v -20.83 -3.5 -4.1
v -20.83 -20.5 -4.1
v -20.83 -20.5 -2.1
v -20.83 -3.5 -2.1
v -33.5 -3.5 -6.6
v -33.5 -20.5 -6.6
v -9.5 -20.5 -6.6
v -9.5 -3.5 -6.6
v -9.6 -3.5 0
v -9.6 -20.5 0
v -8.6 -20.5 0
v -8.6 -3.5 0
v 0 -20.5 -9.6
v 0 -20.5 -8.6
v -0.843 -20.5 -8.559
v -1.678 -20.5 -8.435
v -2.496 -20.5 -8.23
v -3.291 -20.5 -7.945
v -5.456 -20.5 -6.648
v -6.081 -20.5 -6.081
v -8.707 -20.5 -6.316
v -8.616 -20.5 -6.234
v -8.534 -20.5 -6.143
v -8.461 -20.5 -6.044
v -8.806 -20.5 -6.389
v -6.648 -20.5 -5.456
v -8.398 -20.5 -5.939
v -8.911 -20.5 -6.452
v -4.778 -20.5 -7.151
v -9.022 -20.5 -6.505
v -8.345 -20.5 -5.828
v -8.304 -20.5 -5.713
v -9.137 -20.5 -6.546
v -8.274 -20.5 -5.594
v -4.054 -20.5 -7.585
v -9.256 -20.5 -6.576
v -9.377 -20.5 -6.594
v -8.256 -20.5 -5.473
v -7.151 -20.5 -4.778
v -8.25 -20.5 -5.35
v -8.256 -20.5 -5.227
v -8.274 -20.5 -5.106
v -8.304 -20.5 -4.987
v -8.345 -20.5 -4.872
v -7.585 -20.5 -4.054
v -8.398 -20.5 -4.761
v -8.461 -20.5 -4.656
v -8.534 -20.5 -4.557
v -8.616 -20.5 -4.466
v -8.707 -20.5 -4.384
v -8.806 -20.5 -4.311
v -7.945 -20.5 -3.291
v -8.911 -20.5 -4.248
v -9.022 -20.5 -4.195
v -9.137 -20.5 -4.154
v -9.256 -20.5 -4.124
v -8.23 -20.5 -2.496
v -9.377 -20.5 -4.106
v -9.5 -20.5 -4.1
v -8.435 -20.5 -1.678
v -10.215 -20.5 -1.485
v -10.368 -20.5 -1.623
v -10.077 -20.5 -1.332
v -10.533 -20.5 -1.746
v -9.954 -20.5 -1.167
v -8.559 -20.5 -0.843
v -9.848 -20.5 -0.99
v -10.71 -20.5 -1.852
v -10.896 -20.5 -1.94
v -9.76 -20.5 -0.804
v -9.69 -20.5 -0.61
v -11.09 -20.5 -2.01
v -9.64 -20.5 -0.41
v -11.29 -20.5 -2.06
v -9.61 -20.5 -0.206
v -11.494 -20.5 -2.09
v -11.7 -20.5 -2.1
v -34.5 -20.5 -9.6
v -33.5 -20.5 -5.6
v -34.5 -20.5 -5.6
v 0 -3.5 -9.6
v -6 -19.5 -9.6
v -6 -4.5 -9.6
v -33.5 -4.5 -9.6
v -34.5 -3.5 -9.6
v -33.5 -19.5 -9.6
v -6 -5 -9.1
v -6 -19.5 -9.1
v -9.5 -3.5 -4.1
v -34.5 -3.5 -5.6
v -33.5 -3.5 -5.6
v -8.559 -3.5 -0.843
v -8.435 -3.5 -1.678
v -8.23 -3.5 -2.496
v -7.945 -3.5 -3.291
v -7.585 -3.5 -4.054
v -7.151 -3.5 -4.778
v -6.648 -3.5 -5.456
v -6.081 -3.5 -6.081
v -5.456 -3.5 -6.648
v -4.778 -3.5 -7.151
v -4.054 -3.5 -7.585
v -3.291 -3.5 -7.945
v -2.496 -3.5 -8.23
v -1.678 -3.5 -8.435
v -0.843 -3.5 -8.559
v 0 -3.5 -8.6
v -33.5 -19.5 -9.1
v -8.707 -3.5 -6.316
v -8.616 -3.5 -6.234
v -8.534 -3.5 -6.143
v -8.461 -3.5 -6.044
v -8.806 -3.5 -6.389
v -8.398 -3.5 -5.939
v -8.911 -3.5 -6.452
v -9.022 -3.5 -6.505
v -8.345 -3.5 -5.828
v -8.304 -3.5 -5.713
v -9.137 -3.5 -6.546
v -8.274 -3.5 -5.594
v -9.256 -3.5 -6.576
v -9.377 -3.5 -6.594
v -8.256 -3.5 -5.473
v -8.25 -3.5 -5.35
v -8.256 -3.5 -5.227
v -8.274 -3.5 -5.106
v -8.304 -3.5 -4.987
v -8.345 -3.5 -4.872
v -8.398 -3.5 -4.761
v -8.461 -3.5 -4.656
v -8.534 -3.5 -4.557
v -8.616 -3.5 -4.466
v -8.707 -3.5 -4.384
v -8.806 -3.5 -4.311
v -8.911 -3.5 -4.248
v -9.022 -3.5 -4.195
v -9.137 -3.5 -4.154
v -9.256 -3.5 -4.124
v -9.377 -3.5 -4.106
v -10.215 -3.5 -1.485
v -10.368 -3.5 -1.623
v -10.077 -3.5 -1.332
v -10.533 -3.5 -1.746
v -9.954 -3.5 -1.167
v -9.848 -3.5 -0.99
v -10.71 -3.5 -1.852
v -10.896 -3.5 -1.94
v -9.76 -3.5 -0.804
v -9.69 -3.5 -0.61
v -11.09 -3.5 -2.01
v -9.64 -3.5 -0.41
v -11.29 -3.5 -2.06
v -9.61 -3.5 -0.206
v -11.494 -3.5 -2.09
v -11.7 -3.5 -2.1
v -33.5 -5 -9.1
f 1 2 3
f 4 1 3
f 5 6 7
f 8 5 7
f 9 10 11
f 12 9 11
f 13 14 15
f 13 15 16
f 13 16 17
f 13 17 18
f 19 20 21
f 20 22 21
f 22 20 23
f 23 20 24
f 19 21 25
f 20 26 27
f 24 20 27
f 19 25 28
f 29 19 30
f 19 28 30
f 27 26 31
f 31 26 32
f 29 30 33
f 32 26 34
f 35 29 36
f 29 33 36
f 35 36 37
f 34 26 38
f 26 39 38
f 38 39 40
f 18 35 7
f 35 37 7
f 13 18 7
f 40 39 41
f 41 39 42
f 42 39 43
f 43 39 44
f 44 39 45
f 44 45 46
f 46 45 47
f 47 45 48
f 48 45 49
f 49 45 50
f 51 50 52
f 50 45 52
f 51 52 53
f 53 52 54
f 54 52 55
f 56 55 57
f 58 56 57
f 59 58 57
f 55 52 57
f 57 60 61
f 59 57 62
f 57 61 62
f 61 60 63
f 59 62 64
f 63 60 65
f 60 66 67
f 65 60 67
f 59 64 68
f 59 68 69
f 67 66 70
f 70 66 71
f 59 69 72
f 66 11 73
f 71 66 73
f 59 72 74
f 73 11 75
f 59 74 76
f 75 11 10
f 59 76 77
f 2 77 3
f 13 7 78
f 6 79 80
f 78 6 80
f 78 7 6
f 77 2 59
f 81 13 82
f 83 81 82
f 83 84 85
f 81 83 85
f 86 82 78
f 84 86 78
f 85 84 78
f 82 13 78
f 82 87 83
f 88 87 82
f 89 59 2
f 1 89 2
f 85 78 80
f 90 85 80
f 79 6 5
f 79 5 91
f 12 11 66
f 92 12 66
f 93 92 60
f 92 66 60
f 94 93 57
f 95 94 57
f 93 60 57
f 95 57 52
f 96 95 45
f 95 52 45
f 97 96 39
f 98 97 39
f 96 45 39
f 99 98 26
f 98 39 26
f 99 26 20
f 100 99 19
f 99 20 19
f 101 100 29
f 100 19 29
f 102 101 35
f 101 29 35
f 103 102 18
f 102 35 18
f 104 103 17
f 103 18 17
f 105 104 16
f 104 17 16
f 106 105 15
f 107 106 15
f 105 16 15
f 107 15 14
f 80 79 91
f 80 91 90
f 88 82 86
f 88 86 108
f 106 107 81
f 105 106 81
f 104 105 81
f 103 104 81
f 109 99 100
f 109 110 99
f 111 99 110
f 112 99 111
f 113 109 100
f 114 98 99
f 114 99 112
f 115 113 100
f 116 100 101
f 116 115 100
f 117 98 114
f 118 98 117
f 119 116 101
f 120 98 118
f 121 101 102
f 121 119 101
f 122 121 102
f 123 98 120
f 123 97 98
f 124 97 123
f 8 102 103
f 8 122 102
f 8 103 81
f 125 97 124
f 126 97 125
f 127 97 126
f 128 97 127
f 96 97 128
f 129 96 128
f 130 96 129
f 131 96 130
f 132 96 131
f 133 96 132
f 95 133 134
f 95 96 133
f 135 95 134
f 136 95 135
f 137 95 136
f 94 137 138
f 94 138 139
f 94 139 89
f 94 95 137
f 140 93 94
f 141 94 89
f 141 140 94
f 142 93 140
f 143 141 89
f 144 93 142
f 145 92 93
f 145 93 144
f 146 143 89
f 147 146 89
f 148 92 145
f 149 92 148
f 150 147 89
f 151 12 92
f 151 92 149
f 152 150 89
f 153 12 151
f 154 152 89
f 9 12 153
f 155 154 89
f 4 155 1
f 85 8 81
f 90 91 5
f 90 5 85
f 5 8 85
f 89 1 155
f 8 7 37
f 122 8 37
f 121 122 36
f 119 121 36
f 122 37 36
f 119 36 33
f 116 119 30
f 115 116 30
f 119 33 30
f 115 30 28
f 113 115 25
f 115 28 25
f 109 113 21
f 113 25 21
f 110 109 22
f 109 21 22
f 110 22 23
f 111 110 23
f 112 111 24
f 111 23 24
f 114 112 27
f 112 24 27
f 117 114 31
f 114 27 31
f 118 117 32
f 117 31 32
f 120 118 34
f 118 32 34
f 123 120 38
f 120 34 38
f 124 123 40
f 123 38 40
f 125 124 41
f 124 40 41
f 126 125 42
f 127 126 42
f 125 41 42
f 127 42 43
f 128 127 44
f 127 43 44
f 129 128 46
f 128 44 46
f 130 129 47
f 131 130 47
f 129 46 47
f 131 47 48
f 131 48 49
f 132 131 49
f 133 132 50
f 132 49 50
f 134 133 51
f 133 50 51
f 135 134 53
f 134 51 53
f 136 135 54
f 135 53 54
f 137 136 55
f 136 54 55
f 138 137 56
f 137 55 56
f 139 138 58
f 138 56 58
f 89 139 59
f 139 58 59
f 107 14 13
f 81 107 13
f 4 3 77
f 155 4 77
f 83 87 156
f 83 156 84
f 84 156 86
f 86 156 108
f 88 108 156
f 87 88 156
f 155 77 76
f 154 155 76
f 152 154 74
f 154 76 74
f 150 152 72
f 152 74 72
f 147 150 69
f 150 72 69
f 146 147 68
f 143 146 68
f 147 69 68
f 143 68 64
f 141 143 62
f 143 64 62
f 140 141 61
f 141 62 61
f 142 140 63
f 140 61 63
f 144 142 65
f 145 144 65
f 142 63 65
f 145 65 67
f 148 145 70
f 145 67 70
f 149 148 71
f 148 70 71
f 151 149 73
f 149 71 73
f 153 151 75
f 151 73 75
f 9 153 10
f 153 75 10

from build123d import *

# Parameters (mm, degrees)
EXTRUDE015_DEPTH = 27.5
EXTRUDE_DEPTH    = 17


with BuildPart() as extrude015:
    # Sketch020 → Extrude015 (new body)
    with BuildSketch(Plane(origin=(-6, 0, 0), x_dir=(0, -1, 0), z_dir=(-1, 0, 0))):
        Polygon((19.5, -10.1), (19.5, -9.1), (5, -9.1), (4, -10.1), align=None)
    extrude(amount=EXTRUDE015_DEPTH)


with BuildPart() as cut006:
    # Sketch001 → Extrude (new body)
    with BuildSketch(Plane.XZ.offset(25)):
        with BuildLine():
            ThreePointArc((-8.6, 0), (-6.081118, -6.081118), (0, -8.6))
            Line((0, -8.6), (0, -9.6))
            Line((0, -9.6), (-34.5, -9.6))
            Line((-34.5, -9.6), (-34.5, -5.6))
            Line((-33.5, -5.6), (-34.5, -5.6))
            Line((-33.5, -6.6), (-33.5, -5.6))
            Line((-33.5, -6.6), (-9.5, -6.6))
            ThreePointArc((-9.5, -6.6), (-8.25, -5.35), (-9.5, -4.1))
            Line((-9.5, -4.1), (-20.83, -4.1))
            Line((-20.83, -4.1), (-20.83, -2.1))
            Line((-20.83, -2.1), (-11.7, -2.1))
            ThreePointArc((-11.7, -2.1), (-10.215076, -1.484924), (-9.6, 0))
            Line((-9.6, 0), (-8.6, 0))
        make_face()
    extrude(amount=-EXTRUDE_DEPTH)


with BuildPart() as cut006_1:
    # Extrude placement: moved
    add(cut006.part.moved(Location((0, 4.5, 0))))

    # Cut006: cut Extrude015
    add(extrude015.part, mode=Mode.SUBTRACT)


solid = cut006_1.part
